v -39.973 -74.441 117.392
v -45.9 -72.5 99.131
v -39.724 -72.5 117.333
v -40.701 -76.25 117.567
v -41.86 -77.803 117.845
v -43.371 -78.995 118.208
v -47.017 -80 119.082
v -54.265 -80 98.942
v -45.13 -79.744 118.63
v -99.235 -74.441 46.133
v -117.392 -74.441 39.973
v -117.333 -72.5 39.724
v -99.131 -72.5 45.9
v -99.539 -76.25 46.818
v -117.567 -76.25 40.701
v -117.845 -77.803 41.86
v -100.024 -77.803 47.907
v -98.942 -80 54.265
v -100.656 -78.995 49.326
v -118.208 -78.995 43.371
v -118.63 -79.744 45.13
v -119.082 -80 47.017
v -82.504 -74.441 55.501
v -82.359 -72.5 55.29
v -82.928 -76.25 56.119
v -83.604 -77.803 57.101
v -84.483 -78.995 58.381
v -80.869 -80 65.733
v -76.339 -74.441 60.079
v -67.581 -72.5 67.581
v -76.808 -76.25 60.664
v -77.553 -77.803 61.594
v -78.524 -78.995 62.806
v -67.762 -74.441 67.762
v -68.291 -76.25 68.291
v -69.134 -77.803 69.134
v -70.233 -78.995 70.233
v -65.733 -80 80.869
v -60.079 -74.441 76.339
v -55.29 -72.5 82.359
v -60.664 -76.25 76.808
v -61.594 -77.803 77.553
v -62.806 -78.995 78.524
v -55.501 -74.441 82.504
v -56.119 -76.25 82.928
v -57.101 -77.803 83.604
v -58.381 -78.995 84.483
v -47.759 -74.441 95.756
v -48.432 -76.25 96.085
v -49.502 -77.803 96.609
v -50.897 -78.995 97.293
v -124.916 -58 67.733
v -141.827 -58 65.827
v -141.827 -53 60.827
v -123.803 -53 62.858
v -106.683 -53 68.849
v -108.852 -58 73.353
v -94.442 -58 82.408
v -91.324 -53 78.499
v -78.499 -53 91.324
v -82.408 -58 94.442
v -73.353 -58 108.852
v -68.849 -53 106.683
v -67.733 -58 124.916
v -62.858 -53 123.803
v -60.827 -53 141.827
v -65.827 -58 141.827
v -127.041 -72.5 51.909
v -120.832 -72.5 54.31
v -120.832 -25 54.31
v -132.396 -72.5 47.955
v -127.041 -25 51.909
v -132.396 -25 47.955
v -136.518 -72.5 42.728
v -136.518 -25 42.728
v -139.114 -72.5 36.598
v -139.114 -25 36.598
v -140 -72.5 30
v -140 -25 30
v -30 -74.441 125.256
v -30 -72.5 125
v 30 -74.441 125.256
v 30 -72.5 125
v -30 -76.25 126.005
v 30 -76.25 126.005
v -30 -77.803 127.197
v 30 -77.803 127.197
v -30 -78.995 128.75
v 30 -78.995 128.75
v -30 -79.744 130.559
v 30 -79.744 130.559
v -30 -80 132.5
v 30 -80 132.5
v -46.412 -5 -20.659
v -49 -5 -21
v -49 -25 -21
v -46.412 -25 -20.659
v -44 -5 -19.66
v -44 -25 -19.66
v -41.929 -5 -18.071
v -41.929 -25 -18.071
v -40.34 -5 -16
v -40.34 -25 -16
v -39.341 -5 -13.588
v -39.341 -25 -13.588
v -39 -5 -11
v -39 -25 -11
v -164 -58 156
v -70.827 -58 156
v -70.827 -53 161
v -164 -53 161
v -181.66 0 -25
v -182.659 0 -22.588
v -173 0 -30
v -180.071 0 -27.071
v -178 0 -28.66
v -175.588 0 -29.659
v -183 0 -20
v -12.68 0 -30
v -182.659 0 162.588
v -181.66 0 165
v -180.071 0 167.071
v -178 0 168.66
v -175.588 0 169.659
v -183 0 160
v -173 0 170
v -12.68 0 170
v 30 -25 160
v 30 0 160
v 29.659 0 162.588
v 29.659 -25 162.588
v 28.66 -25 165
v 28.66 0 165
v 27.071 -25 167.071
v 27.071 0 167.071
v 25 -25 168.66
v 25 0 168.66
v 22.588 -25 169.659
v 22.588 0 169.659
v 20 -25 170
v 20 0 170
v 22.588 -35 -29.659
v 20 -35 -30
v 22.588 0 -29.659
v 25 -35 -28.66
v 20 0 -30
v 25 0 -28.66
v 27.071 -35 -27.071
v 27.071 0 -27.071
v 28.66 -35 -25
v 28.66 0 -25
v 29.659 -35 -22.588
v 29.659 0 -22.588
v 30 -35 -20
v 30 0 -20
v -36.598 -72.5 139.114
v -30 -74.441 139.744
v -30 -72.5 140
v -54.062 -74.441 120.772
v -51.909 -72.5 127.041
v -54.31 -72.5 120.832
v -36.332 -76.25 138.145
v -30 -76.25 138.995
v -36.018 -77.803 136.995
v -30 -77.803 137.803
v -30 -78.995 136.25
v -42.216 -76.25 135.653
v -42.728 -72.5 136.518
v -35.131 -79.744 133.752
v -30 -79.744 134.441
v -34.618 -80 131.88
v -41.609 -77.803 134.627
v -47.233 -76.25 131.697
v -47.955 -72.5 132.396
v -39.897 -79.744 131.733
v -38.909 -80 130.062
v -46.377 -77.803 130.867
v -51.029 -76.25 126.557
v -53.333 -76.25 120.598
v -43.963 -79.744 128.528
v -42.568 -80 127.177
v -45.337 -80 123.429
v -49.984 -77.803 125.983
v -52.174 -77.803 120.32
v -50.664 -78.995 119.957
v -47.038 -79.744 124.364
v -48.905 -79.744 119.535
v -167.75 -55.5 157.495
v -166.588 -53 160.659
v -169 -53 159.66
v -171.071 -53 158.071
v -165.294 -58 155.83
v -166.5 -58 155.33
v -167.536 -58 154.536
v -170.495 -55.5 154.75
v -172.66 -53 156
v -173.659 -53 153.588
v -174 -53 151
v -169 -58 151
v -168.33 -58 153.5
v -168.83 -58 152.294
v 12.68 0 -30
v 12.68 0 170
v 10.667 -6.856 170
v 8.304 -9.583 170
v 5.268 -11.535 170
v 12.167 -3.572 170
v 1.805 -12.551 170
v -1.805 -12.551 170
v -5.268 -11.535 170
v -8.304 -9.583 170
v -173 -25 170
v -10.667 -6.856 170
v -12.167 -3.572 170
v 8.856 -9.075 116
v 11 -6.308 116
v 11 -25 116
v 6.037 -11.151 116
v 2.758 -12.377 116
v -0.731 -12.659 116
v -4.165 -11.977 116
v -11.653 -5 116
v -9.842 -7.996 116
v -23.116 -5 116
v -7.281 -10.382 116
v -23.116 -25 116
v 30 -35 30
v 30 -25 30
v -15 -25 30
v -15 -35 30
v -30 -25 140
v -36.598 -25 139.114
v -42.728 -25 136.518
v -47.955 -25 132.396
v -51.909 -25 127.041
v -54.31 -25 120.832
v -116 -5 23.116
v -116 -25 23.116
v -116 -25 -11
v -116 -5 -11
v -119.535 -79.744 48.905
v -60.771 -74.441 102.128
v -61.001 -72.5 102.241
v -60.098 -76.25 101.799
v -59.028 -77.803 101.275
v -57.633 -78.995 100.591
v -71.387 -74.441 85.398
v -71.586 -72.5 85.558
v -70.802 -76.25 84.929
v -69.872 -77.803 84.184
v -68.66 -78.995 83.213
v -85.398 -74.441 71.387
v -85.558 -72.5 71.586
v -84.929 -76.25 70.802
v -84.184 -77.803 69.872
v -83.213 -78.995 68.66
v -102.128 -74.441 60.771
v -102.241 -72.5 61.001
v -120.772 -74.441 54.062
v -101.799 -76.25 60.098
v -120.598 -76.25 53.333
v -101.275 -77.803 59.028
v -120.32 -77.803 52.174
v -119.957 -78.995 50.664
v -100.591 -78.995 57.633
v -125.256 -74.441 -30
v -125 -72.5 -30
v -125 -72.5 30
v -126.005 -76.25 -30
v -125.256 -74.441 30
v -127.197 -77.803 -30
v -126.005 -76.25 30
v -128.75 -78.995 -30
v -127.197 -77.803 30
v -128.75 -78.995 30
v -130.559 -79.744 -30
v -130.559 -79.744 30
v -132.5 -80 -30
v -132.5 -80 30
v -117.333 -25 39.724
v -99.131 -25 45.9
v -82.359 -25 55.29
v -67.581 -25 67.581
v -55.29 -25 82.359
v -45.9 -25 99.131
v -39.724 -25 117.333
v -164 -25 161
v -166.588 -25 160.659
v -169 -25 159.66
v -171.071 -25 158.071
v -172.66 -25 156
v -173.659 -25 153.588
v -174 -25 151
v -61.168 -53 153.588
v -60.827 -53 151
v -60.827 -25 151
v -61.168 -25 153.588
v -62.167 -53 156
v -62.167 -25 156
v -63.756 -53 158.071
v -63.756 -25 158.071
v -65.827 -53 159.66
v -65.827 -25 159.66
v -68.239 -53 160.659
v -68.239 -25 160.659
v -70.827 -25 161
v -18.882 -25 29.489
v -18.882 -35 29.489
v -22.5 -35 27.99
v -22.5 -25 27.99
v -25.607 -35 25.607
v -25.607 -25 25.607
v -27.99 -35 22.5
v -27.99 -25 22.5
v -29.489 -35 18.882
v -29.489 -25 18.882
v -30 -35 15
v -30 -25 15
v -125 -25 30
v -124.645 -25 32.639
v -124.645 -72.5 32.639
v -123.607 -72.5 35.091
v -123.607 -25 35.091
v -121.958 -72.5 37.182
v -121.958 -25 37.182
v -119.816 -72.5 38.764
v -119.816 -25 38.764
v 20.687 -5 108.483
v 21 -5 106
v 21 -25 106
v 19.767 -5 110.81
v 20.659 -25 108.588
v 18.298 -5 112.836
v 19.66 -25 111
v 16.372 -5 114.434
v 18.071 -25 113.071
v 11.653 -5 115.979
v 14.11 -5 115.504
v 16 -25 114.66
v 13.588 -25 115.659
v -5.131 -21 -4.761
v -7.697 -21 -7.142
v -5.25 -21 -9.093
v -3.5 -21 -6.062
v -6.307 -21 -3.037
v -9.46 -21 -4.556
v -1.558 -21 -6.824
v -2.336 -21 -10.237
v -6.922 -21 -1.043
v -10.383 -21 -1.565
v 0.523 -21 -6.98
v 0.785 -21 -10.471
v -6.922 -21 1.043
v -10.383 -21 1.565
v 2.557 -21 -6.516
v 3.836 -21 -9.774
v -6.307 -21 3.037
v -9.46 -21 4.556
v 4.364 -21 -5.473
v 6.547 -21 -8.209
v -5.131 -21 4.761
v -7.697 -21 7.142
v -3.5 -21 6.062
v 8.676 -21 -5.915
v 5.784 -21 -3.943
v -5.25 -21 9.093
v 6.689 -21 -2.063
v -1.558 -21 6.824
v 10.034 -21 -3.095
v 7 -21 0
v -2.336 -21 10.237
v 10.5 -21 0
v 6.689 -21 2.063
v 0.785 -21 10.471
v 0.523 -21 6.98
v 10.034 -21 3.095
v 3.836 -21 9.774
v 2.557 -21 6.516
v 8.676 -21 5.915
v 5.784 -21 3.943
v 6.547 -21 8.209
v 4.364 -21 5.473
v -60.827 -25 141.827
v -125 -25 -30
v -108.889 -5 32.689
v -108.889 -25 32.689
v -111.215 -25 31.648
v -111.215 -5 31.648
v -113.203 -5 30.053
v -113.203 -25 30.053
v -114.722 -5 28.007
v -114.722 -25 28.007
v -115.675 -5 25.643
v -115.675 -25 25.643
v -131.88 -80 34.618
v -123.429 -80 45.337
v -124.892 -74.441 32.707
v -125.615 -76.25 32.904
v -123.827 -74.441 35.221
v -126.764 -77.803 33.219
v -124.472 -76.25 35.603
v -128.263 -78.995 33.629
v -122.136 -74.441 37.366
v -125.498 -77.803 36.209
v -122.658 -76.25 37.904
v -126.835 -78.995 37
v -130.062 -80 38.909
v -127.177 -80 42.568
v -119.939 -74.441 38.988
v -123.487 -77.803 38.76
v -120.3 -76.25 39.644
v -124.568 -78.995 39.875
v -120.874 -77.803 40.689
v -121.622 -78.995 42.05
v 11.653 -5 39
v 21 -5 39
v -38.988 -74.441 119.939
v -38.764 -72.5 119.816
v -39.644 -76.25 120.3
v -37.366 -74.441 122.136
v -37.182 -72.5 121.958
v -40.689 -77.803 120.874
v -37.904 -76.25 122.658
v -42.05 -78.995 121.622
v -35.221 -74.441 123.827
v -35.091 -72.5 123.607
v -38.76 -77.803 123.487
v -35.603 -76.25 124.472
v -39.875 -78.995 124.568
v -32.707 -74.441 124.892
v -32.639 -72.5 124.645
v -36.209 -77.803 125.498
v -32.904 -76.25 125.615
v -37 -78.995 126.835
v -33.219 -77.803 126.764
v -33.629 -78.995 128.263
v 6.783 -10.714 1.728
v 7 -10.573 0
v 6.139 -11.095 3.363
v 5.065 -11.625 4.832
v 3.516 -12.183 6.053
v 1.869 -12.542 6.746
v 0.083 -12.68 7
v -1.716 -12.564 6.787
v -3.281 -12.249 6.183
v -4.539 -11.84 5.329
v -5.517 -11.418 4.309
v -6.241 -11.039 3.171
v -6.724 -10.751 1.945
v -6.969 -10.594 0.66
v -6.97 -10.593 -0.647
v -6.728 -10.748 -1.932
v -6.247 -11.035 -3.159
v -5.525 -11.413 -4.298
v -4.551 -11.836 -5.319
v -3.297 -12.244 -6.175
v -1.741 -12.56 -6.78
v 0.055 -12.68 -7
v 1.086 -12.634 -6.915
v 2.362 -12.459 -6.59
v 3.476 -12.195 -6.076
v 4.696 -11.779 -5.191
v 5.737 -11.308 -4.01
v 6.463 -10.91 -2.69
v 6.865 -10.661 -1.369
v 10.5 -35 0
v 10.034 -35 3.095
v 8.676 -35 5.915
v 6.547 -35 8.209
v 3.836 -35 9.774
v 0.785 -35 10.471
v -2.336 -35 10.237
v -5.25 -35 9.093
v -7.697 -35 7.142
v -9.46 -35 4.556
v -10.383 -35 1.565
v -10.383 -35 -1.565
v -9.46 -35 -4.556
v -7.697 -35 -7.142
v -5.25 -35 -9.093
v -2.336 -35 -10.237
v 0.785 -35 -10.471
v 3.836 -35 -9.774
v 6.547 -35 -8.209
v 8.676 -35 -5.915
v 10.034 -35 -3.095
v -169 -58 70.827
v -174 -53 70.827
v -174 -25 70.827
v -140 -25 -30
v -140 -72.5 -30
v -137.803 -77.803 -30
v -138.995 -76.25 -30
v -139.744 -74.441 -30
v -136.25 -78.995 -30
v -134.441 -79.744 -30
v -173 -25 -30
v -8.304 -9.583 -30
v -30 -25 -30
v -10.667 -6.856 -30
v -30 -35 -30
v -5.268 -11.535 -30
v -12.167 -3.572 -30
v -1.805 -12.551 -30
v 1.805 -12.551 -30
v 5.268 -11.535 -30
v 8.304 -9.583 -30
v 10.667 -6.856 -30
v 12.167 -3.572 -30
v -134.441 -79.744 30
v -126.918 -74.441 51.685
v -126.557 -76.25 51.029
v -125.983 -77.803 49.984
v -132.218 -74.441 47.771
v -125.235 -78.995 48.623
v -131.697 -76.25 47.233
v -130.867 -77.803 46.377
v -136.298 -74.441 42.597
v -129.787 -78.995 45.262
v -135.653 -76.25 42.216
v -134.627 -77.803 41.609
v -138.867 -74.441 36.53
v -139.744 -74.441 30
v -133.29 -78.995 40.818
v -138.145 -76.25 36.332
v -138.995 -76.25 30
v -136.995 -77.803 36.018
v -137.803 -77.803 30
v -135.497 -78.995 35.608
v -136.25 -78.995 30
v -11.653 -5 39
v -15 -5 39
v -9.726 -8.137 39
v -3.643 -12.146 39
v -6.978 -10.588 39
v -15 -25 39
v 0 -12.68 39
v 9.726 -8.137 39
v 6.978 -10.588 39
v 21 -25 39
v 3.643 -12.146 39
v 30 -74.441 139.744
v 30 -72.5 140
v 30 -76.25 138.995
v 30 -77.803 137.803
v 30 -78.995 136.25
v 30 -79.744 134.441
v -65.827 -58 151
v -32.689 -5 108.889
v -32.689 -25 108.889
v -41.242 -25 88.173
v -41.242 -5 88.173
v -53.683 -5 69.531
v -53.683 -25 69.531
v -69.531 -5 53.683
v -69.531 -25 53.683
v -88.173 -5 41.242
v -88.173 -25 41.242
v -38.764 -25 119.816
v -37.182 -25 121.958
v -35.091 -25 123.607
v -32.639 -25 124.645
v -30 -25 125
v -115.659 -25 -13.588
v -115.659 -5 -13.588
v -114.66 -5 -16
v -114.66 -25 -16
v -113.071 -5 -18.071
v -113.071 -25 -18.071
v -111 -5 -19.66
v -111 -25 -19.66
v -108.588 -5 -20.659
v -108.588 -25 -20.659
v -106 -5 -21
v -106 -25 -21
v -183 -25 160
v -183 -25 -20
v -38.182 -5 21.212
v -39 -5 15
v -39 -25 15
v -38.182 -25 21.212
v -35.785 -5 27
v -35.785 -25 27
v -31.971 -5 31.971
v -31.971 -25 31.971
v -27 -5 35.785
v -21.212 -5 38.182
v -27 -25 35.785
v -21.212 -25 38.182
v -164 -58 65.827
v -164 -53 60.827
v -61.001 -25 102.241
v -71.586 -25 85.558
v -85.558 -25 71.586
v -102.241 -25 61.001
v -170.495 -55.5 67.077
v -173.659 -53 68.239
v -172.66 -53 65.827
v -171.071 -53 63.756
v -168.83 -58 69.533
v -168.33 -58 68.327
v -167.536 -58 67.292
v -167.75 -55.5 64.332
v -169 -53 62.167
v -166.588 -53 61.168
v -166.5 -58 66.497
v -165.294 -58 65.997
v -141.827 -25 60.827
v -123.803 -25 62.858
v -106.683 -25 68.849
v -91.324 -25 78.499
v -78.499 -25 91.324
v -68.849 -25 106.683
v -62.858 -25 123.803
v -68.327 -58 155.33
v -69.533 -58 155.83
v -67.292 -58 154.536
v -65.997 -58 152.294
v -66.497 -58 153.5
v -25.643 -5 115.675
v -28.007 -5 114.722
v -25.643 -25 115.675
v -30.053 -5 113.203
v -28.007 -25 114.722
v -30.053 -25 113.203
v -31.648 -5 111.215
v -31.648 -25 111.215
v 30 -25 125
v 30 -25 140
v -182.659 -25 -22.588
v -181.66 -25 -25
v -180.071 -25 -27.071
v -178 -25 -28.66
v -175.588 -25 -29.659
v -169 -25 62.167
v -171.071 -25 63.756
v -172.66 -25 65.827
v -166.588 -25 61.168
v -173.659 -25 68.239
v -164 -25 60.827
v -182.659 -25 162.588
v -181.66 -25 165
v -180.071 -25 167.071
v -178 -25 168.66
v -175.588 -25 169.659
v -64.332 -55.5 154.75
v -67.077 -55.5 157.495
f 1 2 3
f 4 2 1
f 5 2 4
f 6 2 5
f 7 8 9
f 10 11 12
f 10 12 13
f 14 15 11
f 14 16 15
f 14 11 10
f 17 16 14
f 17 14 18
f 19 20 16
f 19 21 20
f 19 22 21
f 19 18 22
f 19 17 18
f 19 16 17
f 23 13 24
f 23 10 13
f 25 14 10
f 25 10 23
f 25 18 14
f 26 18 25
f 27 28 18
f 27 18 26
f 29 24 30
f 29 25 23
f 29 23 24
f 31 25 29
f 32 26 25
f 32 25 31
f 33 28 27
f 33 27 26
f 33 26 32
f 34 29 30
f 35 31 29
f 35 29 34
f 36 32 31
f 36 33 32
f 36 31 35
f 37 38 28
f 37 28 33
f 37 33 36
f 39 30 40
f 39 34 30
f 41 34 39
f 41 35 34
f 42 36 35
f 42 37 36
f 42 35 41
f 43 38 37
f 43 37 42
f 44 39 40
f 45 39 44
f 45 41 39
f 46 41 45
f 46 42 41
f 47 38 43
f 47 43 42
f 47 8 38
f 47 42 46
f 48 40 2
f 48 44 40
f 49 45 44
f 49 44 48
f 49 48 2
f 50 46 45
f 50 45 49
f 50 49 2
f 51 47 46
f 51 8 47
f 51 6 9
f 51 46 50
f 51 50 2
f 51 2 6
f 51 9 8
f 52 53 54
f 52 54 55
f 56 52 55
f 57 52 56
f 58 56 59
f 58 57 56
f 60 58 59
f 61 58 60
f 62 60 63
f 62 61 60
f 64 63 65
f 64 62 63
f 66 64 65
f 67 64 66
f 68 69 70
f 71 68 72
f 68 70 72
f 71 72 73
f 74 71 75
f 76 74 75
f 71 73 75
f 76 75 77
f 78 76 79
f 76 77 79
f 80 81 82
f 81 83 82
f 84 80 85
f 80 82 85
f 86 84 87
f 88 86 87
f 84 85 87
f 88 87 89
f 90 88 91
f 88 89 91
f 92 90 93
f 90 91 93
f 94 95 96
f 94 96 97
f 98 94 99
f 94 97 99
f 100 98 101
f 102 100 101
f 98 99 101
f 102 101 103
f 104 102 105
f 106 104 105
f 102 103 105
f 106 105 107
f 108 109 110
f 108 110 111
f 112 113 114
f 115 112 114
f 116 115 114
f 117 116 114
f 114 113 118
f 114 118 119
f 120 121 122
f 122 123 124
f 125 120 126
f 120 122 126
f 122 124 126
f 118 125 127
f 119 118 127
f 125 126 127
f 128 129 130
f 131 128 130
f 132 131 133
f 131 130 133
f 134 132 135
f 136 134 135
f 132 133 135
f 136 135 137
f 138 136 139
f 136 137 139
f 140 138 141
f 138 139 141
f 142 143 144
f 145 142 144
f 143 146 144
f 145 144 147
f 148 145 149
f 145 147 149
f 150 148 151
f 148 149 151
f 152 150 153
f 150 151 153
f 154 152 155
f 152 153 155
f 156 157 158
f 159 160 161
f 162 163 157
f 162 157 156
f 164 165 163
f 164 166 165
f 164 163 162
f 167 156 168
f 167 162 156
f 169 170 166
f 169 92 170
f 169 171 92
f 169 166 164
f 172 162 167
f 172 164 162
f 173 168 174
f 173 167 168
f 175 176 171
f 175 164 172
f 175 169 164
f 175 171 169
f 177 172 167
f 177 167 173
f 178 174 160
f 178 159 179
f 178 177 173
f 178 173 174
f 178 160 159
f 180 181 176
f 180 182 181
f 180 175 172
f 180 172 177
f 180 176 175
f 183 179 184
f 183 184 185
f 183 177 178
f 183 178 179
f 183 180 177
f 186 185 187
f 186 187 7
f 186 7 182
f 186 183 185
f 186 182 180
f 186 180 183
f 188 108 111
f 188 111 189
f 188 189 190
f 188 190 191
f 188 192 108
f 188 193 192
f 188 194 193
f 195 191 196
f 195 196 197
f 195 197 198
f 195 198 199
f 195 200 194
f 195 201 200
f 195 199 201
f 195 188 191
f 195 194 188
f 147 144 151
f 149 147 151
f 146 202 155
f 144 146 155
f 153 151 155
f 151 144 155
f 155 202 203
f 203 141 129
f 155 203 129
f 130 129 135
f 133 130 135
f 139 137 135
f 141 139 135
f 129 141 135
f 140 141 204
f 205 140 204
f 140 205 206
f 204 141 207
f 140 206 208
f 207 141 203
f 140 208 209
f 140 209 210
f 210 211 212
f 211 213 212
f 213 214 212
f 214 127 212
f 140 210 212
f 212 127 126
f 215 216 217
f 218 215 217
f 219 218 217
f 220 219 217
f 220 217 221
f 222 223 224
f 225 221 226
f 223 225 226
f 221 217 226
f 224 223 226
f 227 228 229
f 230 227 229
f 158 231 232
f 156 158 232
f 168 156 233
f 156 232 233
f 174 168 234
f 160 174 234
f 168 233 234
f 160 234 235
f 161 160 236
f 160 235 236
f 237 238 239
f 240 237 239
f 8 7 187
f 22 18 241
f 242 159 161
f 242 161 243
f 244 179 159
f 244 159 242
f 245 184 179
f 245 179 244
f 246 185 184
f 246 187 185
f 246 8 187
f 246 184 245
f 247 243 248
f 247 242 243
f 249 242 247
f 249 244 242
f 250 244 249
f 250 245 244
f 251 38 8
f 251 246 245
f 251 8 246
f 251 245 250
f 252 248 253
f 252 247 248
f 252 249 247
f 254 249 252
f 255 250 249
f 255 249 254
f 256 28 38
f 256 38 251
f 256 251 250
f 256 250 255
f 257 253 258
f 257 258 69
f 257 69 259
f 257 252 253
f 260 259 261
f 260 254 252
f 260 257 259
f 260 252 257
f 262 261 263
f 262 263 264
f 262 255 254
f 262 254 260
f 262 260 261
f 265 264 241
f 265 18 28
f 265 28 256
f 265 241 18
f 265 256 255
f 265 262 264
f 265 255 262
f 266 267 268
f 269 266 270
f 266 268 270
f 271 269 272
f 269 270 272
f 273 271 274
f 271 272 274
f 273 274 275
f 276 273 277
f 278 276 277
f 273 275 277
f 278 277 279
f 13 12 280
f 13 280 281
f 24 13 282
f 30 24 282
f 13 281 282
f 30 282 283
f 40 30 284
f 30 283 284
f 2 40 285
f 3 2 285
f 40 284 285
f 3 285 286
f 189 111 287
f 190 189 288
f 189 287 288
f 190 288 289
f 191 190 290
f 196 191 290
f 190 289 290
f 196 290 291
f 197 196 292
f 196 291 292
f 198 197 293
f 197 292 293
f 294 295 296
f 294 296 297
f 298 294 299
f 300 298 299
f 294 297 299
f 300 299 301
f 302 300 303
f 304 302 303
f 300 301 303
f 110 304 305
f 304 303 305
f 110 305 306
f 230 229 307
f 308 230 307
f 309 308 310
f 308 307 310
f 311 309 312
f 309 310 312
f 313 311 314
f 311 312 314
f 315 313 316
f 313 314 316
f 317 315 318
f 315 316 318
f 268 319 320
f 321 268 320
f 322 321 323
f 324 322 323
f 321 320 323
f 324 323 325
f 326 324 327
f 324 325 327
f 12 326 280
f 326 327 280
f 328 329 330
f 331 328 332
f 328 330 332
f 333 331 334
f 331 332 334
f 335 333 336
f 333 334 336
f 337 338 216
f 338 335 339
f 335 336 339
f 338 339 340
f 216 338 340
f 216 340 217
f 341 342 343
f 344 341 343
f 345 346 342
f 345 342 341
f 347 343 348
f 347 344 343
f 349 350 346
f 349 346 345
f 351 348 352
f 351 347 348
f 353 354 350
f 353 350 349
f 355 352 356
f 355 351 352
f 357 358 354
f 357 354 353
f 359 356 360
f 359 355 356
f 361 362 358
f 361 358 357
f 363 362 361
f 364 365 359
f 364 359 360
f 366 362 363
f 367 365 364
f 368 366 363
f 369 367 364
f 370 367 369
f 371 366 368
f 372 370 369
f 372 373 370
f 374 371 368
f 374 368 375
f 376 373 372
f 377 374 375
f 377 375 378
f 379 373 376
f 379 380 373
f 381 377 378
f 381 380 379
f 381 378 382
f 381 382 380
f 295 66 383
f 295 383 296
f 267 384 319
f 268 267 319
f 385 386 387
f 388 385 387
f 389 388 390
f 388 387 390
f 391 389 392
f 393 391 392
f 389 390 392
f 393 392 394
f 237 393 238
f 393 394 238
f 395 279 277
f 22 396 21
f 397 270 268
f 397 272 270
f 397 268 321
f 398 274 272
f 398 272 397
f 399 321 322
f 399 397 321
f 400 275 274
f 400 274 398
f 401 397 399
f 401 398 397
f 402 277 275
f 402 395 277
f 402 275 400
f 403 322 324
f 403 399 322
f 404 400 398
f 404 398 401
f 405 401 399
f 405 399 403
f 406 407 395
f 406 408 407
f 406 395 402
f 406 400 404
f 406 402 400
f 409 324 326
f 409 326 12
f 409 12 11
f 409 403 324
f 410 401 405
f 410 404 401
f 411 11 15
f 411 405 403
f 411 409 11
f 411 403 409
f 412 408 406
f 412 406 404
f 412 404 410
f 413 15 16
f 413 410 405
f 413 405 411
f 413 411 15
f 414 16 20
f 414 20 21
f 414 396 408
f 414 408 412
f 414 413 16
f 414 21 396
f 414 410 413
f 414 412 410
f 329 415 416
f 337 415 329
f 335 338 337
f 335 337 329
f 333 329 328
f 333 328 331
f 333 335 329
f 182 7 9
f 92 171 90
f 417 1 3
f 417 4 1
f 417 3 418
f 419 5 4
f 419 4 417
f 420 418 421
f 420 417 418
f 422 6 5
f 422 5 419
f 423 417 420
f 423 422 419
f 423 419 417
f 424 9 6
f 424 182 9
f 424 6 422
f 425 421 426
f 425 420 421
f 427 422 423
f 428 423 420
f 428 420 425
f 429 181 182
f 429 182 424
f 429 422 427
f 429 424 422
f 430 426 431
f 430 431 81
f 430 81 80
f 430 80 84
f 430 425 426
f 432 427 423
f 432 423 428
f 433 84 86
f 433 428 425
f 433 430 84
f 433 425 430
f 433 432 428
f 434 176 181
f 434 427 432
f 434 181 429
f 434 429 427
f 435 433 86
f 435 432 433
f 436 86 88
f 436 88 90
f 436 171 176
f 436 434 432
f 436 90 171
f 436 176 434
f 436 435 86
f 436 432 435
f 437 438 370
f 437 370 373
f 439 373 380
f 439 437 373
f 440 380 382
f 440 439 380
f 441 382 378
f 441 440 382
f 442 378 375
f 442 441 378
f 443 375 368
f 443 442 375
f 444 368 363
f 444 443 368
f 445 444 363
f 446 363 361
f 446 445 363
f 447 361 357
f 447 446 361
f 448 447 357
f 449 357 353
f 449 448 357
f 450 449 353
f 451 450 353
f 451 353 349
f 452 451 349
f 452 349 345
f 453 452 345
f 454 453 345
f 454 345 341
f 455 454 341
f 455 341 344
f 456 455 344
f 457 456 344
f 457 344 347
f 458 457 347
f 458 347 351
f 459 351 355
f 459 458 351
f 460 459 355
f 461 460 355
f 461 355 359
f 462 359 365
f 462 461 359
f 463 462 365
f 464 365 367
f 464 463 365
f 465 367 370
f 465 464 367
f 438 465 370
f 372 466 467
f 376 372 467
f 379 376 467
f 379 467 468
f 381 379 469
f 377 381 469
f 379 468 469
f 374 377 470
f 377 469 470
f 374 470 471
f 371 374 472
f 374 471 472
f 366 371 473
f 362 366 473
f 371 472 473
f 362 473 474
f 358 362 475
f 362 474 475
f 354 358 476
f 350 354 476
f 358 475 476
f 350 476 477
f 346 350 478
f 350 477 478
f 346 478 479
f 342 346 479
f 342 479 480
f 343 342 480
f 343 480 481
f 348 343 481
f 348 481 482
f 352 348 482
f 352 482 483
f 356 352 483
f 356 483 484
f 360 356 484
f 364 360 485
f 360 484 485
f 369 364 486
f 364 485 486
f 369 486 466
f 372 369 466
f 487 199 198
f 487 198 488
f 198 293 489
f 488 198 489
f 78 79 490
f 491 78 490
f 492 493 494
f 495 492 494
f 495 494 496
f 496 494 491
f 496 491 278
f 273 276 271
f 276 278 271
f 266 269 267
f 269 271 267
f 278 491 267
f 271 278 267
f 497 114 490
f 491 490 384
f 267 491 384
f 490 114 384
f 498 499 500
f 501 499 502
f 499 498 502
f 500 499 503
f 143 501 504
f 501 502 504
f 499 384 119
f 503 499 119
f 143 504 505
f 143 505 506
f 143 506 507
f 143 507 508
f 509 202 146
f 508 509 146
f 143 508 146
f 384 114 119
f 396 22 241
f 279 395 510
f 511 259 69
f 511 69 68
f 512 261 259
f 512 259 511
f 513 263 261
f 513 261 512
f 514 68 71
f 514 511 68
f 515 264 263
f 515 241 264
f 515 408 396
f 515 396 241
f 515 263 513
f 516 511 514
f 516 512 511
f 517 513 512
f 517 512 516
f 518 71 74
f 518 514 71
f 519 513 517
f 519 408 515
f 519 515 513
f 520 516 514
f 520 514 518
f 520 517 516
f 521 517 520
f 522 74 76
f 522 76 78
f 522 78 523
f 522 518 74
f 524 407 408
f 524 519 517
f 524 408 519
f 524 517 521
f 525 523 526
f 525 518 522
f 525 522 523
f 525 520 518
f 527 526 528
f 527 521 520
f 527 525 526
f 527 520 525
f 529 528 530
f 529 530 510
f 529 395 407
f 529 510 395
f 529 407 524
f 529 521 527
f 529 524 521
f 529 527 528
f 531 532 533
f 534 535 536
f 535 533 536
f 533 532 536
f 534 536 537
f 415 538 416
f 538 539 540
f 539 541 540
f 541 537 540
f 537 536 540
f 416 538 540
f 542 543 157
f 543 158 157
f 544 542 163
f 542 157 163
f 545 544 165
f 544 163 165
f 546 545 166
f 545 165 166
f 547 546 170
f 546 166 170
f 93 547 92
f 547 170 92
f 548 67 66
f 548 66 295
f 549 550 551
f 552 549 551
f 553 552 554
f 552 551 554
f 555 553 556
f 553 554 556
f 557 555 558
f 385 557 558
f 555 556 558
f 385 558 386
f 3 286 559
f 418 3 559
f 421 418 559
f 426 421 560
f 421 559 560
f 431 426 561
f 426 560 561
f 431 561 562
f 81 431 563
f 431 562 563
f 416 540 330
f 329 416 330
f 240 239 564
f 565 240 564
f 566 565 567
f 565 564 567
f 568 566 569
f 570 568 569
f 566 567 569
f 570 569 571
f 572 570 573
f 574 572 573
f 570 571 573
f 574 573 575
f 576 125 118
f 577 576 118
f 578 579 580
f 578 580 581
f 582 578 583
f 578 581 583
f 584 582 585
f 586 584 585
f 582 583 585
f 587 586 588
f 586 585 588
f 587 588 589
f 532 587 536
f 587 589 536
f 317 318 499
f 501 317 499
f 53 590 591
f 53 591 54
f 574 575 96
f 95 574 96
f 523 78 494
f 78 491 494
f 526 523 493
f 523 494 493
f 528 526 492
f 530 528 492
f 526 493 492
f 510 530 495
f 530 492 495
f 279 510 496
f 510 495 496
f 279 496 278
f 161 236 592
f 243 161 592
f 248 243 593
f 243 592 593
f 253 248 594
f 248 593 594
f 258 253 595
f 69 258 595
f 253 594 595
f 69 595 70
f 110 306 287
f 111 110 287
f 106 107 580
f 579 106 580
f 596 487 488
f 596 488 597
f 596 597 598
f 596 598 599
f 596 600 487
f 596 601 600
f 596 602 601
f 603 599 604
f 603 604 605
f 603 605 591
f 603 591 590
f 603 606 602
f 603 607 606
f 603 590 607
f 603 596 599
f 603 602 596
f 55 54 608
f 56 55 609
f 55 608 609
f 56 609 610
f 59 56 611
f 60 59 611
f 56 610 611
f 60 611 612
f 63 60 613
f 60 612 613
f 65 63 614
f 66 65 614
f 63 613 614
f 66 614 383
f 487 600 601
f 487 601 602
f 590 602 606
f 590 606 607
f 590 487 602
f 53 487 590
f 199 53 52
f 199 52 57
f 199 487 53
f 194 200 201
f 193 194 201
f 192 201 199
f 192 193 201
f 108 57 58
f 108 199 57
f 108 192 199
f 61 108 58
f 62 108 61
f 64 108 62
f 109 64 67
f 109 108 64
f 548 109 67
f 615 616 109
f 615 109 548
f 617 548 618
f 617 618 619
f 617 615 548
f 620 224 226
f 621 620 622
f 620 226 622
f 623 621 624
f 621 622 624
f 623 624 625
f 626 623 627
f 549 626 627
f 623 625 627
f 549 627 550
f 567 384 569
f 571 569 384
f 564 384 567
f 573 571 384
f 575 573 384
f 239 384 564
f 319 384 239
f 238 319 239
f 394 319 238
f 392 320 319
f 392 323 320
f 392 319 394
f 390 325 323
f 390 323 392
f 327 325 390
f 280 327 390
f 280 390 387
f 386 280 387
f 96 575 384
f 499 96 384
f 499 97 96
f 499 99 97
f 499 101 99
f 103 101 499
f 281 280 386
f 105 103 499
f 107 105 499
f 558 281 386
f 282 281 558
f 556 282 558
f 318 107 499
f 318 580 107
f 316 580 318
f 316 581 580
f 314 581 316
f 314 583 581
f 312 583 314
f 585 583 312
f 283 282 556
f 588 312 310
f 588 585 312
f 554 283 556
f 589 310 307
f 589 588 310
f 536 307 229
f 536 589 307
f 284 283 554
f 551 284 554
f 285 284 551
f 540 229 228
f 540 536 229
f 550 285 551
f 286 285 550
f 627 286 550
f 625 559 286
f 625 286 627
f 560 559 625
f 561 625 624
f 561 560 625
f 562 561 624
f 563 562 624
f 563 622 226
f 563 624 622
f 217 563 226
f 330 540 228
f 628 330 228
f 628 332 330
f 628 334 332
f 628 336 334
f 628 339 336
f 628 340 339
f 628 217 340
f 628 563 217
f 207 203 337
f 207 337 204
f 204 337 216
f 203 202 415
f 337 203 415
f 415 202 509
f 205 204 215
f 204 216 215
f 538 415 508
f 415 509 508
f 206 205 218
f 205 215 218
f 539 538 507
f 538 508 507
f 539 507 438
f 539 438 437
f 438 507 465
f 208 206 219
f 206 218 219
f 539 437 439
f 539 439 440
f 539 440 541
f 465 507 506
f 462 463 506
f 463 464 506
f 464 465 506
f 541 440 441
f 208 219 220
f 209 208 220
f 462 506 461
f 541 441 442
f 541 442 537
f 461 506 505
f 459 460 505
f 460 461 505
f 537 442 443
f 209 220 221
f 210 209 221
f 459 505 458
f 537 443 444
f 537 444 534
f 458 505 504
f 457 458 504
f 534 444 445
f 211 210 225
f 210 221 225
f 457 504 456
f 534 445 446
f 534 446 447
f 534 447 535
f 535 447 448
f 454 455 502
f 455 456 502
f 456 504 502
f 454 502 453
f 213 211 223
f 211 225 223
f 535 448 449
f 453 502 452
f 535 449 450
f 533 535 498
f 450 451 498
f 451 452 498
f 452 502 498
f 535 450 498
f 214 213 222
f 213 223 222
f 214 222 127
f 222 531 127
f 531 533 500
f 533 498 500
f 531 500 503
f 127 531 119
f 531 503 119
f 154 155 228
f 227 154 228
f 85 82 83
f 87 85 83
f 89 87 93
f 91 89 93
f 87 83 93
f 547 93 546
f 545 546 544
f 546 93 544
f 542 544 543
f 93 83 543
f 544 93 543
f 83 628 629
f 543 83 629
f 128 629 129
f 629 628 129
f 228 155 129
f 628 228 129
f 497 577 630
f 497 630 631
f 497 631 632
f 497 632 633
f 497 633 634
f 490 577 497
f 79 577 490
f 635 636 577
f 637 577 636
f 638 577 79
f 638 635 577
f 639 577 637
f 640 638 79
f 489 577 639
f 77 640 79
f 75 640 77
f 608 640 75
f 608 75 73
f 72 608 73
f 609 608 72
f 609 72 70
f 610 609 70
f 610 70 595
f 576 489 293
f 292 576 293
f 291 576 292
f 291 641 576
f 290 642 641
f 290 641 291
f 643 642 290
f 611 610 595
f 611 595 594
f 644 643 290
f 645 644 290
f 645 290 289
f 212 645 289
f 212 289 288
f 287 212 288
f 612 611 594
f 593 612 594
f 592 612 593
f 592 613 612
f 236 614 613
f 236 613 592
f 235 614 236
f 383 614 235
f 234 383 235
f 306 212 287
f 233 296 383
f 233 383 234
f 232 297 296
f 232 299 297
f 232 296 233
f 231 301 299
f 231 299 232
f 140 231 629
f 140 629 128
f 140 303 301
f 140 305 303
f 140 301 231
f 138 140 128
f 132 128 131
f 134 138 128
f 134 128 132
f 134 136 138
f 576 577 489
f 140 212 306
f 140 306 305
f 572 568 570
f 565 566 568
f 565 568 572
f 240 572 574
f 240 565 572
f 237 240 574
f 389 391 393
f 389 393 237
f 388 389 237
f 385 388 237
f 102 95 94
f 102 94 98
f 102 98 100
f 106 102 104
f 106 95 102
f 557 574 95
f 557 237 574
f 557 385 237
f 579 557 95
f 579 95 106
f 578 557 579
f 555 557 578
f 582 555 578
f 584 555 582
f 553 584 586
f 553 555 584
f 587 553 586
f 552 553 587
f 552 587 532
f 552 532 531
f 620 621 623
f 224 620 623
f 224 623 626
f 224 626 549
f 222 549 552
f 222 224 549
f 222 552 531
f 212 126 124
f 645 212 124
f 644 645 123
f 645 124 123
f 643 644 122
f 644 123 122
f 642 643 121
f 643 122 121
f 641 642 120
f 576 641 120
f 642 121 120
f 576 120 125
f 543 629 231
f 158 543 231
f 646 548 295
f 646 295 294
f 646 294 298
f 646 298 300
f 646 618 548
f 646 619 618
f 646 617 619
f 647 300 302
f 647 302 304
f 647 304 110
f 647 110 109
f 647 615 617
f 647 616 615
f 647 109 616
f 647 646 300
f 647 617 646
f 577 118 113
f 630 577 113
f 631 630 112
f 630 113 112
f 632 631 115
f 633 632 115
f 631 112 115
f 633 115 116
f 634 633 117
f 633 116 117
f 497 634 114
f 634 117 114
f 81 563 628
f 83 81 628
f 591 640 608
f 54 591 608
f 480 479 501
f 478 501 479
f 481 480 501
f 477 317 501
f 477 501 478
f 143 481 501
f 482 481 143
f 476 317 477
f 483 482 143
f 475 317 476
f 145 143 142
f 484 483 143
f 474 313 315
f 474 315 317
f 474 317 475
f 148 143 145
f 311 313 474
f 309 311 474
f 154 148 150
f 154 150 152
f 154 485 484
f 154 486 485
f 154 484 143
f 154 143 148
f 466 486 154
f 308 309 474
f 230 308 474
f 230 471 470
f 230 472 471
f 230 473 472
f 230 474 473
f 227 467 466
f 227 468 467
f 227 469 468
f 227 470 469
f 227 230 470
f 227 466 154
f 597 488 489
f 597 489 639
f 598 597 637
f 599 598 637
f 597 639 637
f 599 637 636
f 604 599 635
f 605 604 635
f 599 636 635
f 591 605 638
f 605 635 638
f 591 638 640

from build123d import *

# Parameters (mm, degrees)
F0_R      = 7
F1_DEPTH  = 25
F3_DEPTH  = 10
F4_R      = 10.5
F5_DEPTH  = 14
F7_DEPTH  = 55
F8_R      = 7.49999
F10_DEPTH = 20
F12_DEPTH = 33
F13_SIZE2 = 5
F13_SIZE  = 5
F15_DEPTH = 400


# Not quite as in the source:
# - a fillet or chamfer is up to 0.001 mm smaller than in the source, because OpenCascade refuses the exact size


with BuildPart() as f1:
    # F0 (on Front) → F1 (new body)
    with BuildSketch(Plane.XZ):
        with BuildLine():
            ThreePointArc((-183, -20), (-180.0710678119, -27.0710678119), (-173, -30))
            Line((-173, -30), (20, -30))
            ThreePointArc((20, -30), (27.0710678119, -27.0710678119), (30, -20))
            Line((30, -20), (30, 160))
            ThreePointArc((30, 160), (27.0710678119, 167.0710678119), (20, 170))
            Line((20, 170), (-173, 170))
            ThreePointArc((-173, 170), (-180.0710678119, 167.0710678119), (-183, 160))
            Line((-183, 160), (-183, -20))
        make_face()
        Circle(F0_R, mode=Mode.SUBTRACT)
    extrude(amount=F1_DEPTH)

    # F2 (on face) → F3 (join)
    with BuildSketch(Plane.XZ.offset(25)):
        with BuildLine():
            Line((-30, 15), (-30, -30))
            Line((-30, -30), (20, -30))
            ThreePointArc((20, -30), (27.0710678119, -27.0710678119), (30, -20))
            Line((30, -20), (30, 30))
            Line((30, 30), (-15, 30))
            ThreePointArc((-15, 30), (-25.6066017178, 25.6066017178), (-30, 15))
        make_face()
    extrude(amount=F3_DEPTH)

    # F4 (on face) → F5 (cut)
    with BuildSketch(Plane.XZ.offset(35)):
        Circle(F4_R)
    extrude(amount=-F5_DEPTH, mode=Mode.SUBTRACT)

    # F6 (on face) → F7 (join)
    with BuildSketch(Plane.XZ.offset(25)):
        with BuildLine():
            Line((-140, 30), (-140, -30))
            Line((-140, -30), (-125, -30))
            Line((-125, -30), (-125, 30))
            ThreePointArc((-125, 30), (-122.8526407389, 36.191609922), (-117.3327933147, 39.7240976625))
            ThreePointArc((-117.3327933147, 39.7240976625), (-67.5809110947, 67.5809110947), (-39.7240976625, 117.3327933147))
            ThreePointArc((-39.7240976625, 117.3327933147), (-36.191609922, 122.8526407389), (-30, 125))
            Line((-30, 125), (30, 125))
            Line((30, 125), (30, 140))
            Line((30, 140), (-30, 140))
            ThreePointArc((-30, 140), (-45.479024805, 134.6316018472), (-54.3102441564, 120.8319832868))
            ThreePointArc((-54.3102441564, 120.8319832868), (-78.1875128125, 78.1875128125), (-120.8319832868, 54.3102441564))
            ThreePointArc((-120.8319832868, 54.3102441564), (-134.6316018472, 45.479024805), (-140, 30))
        make_face()
    extrude(amount=F7_DEPTH)

    # F8 (radius 7.5 in the source; OpenCascade refuses exactly that, so slightly less here)
    f8_edges = [f1.edges().sort_by_distance(p)[0] for p in [
        (-125, -80, 0),
        (-140, -80, 0),
    ]]
    fillet(f8_edges, radius=F8_R)

    # F9 (on face) → F10 (cut)
    with BuildSketch(Plane.XZ.offset(25)):
        with BuildLine():
            ThreePointArc((-108.8892841225, 32.6891427357), (-114.0278528021, 29.0783179154), (-116, 23.1156356845))
            Line((-116, 23.1156356845), (-116, -11))
            ThreePointArc((-116, -11), (-113.0710678119, -18.0710678119), (-106, -21))
            Line((-106, -21), (-49, -21))
            ThreePointArc((-49, -21), (-41.9289321881, -18.0710678119), (-39, -11))
            Line((-39, -11), (-39, 15))
            ThreePointArc((-39, 15), (-31.9705627485, 31.9705627485), (-15, 39))
            Line((-15, 39), (21, 39))
            Line((21, 39), (21, 106))
            ThreePointArc((21, 106), (18.0710678119, 113.0710678119), (11, 116))
            Line((11, 116), (-23.1156356845, 116))
            ThreePointArc((-23.1156356845, 116), (-29.0783179154, 114.0278528021), (-32.6891427357, 108.8892841225))
            ThreePointArc((-32.6891427357, 108.8892841225), (-61.216950064, 61.216950064), (-108.8892841225, 32.6891427357))
        make_face()
    extrude(amount=-F10_DEPTH, mode=Mode.SUBTRACT)

    # F11 (on face) → F12 (join)
    with BuildSketch(Plane.XZ.offset(25)):
        with BuildLine():
            Line((-70.8271231193, 161), (-164, 161))
            ThreePointArc((-164, 161), (-171.0710678119, 158.0710678119), (-174, 151))
            Line((-174, 151), (-174, 70.8271231193))
            ThreePointArc((-174, 70.8271231193), (-171.0710678119, 63.7560553074), (-164, 60.8271231193))
            Line((-164, 60.8271231193), (-141.8271231193, 60.8271231193))
            ThreePointArc((-141.8271231193, 60.8271231193), (-84.5514738432, 84.5514738432), (-60.8271231193, 141.8271231193))
            Line((-60.8271231193, 141.8271231193), (-60.8271231193, 151))
            ThreePointArc((-60.8271231193, 151), (-63.7560553074, 158.0710678119), (-70.8271231193, 161))
        make_face()
    extrude(amount=F12_DEPTH)

    # F13
    f13_edges = [f1.edges().sort_by_distance(p)[0] for p in [
        (-174, -58, 110.913562),
    ]]
    chamfer(f13_edges, length=F13_SIZE, length2=F13_SIZE2)

    # F14 (on face) → F15 (cut)
    with BuildSketch(Plane(origin=(0, 0, -30), x_dir=(1, 0, 0), z_dir=(0, 0, -1))):
        with BuildLine():
            Line((-12.6804448871, 0), (12.6804448871, 0))
            ThreePointArc((12.6804448871, 0), (0, 12.6804448871), (-12.6804448871, 0))
        make_face()
    extrude(amount=-F15_DEPTH, mode=Mode.SUBTRACT)


solid = f1.part
